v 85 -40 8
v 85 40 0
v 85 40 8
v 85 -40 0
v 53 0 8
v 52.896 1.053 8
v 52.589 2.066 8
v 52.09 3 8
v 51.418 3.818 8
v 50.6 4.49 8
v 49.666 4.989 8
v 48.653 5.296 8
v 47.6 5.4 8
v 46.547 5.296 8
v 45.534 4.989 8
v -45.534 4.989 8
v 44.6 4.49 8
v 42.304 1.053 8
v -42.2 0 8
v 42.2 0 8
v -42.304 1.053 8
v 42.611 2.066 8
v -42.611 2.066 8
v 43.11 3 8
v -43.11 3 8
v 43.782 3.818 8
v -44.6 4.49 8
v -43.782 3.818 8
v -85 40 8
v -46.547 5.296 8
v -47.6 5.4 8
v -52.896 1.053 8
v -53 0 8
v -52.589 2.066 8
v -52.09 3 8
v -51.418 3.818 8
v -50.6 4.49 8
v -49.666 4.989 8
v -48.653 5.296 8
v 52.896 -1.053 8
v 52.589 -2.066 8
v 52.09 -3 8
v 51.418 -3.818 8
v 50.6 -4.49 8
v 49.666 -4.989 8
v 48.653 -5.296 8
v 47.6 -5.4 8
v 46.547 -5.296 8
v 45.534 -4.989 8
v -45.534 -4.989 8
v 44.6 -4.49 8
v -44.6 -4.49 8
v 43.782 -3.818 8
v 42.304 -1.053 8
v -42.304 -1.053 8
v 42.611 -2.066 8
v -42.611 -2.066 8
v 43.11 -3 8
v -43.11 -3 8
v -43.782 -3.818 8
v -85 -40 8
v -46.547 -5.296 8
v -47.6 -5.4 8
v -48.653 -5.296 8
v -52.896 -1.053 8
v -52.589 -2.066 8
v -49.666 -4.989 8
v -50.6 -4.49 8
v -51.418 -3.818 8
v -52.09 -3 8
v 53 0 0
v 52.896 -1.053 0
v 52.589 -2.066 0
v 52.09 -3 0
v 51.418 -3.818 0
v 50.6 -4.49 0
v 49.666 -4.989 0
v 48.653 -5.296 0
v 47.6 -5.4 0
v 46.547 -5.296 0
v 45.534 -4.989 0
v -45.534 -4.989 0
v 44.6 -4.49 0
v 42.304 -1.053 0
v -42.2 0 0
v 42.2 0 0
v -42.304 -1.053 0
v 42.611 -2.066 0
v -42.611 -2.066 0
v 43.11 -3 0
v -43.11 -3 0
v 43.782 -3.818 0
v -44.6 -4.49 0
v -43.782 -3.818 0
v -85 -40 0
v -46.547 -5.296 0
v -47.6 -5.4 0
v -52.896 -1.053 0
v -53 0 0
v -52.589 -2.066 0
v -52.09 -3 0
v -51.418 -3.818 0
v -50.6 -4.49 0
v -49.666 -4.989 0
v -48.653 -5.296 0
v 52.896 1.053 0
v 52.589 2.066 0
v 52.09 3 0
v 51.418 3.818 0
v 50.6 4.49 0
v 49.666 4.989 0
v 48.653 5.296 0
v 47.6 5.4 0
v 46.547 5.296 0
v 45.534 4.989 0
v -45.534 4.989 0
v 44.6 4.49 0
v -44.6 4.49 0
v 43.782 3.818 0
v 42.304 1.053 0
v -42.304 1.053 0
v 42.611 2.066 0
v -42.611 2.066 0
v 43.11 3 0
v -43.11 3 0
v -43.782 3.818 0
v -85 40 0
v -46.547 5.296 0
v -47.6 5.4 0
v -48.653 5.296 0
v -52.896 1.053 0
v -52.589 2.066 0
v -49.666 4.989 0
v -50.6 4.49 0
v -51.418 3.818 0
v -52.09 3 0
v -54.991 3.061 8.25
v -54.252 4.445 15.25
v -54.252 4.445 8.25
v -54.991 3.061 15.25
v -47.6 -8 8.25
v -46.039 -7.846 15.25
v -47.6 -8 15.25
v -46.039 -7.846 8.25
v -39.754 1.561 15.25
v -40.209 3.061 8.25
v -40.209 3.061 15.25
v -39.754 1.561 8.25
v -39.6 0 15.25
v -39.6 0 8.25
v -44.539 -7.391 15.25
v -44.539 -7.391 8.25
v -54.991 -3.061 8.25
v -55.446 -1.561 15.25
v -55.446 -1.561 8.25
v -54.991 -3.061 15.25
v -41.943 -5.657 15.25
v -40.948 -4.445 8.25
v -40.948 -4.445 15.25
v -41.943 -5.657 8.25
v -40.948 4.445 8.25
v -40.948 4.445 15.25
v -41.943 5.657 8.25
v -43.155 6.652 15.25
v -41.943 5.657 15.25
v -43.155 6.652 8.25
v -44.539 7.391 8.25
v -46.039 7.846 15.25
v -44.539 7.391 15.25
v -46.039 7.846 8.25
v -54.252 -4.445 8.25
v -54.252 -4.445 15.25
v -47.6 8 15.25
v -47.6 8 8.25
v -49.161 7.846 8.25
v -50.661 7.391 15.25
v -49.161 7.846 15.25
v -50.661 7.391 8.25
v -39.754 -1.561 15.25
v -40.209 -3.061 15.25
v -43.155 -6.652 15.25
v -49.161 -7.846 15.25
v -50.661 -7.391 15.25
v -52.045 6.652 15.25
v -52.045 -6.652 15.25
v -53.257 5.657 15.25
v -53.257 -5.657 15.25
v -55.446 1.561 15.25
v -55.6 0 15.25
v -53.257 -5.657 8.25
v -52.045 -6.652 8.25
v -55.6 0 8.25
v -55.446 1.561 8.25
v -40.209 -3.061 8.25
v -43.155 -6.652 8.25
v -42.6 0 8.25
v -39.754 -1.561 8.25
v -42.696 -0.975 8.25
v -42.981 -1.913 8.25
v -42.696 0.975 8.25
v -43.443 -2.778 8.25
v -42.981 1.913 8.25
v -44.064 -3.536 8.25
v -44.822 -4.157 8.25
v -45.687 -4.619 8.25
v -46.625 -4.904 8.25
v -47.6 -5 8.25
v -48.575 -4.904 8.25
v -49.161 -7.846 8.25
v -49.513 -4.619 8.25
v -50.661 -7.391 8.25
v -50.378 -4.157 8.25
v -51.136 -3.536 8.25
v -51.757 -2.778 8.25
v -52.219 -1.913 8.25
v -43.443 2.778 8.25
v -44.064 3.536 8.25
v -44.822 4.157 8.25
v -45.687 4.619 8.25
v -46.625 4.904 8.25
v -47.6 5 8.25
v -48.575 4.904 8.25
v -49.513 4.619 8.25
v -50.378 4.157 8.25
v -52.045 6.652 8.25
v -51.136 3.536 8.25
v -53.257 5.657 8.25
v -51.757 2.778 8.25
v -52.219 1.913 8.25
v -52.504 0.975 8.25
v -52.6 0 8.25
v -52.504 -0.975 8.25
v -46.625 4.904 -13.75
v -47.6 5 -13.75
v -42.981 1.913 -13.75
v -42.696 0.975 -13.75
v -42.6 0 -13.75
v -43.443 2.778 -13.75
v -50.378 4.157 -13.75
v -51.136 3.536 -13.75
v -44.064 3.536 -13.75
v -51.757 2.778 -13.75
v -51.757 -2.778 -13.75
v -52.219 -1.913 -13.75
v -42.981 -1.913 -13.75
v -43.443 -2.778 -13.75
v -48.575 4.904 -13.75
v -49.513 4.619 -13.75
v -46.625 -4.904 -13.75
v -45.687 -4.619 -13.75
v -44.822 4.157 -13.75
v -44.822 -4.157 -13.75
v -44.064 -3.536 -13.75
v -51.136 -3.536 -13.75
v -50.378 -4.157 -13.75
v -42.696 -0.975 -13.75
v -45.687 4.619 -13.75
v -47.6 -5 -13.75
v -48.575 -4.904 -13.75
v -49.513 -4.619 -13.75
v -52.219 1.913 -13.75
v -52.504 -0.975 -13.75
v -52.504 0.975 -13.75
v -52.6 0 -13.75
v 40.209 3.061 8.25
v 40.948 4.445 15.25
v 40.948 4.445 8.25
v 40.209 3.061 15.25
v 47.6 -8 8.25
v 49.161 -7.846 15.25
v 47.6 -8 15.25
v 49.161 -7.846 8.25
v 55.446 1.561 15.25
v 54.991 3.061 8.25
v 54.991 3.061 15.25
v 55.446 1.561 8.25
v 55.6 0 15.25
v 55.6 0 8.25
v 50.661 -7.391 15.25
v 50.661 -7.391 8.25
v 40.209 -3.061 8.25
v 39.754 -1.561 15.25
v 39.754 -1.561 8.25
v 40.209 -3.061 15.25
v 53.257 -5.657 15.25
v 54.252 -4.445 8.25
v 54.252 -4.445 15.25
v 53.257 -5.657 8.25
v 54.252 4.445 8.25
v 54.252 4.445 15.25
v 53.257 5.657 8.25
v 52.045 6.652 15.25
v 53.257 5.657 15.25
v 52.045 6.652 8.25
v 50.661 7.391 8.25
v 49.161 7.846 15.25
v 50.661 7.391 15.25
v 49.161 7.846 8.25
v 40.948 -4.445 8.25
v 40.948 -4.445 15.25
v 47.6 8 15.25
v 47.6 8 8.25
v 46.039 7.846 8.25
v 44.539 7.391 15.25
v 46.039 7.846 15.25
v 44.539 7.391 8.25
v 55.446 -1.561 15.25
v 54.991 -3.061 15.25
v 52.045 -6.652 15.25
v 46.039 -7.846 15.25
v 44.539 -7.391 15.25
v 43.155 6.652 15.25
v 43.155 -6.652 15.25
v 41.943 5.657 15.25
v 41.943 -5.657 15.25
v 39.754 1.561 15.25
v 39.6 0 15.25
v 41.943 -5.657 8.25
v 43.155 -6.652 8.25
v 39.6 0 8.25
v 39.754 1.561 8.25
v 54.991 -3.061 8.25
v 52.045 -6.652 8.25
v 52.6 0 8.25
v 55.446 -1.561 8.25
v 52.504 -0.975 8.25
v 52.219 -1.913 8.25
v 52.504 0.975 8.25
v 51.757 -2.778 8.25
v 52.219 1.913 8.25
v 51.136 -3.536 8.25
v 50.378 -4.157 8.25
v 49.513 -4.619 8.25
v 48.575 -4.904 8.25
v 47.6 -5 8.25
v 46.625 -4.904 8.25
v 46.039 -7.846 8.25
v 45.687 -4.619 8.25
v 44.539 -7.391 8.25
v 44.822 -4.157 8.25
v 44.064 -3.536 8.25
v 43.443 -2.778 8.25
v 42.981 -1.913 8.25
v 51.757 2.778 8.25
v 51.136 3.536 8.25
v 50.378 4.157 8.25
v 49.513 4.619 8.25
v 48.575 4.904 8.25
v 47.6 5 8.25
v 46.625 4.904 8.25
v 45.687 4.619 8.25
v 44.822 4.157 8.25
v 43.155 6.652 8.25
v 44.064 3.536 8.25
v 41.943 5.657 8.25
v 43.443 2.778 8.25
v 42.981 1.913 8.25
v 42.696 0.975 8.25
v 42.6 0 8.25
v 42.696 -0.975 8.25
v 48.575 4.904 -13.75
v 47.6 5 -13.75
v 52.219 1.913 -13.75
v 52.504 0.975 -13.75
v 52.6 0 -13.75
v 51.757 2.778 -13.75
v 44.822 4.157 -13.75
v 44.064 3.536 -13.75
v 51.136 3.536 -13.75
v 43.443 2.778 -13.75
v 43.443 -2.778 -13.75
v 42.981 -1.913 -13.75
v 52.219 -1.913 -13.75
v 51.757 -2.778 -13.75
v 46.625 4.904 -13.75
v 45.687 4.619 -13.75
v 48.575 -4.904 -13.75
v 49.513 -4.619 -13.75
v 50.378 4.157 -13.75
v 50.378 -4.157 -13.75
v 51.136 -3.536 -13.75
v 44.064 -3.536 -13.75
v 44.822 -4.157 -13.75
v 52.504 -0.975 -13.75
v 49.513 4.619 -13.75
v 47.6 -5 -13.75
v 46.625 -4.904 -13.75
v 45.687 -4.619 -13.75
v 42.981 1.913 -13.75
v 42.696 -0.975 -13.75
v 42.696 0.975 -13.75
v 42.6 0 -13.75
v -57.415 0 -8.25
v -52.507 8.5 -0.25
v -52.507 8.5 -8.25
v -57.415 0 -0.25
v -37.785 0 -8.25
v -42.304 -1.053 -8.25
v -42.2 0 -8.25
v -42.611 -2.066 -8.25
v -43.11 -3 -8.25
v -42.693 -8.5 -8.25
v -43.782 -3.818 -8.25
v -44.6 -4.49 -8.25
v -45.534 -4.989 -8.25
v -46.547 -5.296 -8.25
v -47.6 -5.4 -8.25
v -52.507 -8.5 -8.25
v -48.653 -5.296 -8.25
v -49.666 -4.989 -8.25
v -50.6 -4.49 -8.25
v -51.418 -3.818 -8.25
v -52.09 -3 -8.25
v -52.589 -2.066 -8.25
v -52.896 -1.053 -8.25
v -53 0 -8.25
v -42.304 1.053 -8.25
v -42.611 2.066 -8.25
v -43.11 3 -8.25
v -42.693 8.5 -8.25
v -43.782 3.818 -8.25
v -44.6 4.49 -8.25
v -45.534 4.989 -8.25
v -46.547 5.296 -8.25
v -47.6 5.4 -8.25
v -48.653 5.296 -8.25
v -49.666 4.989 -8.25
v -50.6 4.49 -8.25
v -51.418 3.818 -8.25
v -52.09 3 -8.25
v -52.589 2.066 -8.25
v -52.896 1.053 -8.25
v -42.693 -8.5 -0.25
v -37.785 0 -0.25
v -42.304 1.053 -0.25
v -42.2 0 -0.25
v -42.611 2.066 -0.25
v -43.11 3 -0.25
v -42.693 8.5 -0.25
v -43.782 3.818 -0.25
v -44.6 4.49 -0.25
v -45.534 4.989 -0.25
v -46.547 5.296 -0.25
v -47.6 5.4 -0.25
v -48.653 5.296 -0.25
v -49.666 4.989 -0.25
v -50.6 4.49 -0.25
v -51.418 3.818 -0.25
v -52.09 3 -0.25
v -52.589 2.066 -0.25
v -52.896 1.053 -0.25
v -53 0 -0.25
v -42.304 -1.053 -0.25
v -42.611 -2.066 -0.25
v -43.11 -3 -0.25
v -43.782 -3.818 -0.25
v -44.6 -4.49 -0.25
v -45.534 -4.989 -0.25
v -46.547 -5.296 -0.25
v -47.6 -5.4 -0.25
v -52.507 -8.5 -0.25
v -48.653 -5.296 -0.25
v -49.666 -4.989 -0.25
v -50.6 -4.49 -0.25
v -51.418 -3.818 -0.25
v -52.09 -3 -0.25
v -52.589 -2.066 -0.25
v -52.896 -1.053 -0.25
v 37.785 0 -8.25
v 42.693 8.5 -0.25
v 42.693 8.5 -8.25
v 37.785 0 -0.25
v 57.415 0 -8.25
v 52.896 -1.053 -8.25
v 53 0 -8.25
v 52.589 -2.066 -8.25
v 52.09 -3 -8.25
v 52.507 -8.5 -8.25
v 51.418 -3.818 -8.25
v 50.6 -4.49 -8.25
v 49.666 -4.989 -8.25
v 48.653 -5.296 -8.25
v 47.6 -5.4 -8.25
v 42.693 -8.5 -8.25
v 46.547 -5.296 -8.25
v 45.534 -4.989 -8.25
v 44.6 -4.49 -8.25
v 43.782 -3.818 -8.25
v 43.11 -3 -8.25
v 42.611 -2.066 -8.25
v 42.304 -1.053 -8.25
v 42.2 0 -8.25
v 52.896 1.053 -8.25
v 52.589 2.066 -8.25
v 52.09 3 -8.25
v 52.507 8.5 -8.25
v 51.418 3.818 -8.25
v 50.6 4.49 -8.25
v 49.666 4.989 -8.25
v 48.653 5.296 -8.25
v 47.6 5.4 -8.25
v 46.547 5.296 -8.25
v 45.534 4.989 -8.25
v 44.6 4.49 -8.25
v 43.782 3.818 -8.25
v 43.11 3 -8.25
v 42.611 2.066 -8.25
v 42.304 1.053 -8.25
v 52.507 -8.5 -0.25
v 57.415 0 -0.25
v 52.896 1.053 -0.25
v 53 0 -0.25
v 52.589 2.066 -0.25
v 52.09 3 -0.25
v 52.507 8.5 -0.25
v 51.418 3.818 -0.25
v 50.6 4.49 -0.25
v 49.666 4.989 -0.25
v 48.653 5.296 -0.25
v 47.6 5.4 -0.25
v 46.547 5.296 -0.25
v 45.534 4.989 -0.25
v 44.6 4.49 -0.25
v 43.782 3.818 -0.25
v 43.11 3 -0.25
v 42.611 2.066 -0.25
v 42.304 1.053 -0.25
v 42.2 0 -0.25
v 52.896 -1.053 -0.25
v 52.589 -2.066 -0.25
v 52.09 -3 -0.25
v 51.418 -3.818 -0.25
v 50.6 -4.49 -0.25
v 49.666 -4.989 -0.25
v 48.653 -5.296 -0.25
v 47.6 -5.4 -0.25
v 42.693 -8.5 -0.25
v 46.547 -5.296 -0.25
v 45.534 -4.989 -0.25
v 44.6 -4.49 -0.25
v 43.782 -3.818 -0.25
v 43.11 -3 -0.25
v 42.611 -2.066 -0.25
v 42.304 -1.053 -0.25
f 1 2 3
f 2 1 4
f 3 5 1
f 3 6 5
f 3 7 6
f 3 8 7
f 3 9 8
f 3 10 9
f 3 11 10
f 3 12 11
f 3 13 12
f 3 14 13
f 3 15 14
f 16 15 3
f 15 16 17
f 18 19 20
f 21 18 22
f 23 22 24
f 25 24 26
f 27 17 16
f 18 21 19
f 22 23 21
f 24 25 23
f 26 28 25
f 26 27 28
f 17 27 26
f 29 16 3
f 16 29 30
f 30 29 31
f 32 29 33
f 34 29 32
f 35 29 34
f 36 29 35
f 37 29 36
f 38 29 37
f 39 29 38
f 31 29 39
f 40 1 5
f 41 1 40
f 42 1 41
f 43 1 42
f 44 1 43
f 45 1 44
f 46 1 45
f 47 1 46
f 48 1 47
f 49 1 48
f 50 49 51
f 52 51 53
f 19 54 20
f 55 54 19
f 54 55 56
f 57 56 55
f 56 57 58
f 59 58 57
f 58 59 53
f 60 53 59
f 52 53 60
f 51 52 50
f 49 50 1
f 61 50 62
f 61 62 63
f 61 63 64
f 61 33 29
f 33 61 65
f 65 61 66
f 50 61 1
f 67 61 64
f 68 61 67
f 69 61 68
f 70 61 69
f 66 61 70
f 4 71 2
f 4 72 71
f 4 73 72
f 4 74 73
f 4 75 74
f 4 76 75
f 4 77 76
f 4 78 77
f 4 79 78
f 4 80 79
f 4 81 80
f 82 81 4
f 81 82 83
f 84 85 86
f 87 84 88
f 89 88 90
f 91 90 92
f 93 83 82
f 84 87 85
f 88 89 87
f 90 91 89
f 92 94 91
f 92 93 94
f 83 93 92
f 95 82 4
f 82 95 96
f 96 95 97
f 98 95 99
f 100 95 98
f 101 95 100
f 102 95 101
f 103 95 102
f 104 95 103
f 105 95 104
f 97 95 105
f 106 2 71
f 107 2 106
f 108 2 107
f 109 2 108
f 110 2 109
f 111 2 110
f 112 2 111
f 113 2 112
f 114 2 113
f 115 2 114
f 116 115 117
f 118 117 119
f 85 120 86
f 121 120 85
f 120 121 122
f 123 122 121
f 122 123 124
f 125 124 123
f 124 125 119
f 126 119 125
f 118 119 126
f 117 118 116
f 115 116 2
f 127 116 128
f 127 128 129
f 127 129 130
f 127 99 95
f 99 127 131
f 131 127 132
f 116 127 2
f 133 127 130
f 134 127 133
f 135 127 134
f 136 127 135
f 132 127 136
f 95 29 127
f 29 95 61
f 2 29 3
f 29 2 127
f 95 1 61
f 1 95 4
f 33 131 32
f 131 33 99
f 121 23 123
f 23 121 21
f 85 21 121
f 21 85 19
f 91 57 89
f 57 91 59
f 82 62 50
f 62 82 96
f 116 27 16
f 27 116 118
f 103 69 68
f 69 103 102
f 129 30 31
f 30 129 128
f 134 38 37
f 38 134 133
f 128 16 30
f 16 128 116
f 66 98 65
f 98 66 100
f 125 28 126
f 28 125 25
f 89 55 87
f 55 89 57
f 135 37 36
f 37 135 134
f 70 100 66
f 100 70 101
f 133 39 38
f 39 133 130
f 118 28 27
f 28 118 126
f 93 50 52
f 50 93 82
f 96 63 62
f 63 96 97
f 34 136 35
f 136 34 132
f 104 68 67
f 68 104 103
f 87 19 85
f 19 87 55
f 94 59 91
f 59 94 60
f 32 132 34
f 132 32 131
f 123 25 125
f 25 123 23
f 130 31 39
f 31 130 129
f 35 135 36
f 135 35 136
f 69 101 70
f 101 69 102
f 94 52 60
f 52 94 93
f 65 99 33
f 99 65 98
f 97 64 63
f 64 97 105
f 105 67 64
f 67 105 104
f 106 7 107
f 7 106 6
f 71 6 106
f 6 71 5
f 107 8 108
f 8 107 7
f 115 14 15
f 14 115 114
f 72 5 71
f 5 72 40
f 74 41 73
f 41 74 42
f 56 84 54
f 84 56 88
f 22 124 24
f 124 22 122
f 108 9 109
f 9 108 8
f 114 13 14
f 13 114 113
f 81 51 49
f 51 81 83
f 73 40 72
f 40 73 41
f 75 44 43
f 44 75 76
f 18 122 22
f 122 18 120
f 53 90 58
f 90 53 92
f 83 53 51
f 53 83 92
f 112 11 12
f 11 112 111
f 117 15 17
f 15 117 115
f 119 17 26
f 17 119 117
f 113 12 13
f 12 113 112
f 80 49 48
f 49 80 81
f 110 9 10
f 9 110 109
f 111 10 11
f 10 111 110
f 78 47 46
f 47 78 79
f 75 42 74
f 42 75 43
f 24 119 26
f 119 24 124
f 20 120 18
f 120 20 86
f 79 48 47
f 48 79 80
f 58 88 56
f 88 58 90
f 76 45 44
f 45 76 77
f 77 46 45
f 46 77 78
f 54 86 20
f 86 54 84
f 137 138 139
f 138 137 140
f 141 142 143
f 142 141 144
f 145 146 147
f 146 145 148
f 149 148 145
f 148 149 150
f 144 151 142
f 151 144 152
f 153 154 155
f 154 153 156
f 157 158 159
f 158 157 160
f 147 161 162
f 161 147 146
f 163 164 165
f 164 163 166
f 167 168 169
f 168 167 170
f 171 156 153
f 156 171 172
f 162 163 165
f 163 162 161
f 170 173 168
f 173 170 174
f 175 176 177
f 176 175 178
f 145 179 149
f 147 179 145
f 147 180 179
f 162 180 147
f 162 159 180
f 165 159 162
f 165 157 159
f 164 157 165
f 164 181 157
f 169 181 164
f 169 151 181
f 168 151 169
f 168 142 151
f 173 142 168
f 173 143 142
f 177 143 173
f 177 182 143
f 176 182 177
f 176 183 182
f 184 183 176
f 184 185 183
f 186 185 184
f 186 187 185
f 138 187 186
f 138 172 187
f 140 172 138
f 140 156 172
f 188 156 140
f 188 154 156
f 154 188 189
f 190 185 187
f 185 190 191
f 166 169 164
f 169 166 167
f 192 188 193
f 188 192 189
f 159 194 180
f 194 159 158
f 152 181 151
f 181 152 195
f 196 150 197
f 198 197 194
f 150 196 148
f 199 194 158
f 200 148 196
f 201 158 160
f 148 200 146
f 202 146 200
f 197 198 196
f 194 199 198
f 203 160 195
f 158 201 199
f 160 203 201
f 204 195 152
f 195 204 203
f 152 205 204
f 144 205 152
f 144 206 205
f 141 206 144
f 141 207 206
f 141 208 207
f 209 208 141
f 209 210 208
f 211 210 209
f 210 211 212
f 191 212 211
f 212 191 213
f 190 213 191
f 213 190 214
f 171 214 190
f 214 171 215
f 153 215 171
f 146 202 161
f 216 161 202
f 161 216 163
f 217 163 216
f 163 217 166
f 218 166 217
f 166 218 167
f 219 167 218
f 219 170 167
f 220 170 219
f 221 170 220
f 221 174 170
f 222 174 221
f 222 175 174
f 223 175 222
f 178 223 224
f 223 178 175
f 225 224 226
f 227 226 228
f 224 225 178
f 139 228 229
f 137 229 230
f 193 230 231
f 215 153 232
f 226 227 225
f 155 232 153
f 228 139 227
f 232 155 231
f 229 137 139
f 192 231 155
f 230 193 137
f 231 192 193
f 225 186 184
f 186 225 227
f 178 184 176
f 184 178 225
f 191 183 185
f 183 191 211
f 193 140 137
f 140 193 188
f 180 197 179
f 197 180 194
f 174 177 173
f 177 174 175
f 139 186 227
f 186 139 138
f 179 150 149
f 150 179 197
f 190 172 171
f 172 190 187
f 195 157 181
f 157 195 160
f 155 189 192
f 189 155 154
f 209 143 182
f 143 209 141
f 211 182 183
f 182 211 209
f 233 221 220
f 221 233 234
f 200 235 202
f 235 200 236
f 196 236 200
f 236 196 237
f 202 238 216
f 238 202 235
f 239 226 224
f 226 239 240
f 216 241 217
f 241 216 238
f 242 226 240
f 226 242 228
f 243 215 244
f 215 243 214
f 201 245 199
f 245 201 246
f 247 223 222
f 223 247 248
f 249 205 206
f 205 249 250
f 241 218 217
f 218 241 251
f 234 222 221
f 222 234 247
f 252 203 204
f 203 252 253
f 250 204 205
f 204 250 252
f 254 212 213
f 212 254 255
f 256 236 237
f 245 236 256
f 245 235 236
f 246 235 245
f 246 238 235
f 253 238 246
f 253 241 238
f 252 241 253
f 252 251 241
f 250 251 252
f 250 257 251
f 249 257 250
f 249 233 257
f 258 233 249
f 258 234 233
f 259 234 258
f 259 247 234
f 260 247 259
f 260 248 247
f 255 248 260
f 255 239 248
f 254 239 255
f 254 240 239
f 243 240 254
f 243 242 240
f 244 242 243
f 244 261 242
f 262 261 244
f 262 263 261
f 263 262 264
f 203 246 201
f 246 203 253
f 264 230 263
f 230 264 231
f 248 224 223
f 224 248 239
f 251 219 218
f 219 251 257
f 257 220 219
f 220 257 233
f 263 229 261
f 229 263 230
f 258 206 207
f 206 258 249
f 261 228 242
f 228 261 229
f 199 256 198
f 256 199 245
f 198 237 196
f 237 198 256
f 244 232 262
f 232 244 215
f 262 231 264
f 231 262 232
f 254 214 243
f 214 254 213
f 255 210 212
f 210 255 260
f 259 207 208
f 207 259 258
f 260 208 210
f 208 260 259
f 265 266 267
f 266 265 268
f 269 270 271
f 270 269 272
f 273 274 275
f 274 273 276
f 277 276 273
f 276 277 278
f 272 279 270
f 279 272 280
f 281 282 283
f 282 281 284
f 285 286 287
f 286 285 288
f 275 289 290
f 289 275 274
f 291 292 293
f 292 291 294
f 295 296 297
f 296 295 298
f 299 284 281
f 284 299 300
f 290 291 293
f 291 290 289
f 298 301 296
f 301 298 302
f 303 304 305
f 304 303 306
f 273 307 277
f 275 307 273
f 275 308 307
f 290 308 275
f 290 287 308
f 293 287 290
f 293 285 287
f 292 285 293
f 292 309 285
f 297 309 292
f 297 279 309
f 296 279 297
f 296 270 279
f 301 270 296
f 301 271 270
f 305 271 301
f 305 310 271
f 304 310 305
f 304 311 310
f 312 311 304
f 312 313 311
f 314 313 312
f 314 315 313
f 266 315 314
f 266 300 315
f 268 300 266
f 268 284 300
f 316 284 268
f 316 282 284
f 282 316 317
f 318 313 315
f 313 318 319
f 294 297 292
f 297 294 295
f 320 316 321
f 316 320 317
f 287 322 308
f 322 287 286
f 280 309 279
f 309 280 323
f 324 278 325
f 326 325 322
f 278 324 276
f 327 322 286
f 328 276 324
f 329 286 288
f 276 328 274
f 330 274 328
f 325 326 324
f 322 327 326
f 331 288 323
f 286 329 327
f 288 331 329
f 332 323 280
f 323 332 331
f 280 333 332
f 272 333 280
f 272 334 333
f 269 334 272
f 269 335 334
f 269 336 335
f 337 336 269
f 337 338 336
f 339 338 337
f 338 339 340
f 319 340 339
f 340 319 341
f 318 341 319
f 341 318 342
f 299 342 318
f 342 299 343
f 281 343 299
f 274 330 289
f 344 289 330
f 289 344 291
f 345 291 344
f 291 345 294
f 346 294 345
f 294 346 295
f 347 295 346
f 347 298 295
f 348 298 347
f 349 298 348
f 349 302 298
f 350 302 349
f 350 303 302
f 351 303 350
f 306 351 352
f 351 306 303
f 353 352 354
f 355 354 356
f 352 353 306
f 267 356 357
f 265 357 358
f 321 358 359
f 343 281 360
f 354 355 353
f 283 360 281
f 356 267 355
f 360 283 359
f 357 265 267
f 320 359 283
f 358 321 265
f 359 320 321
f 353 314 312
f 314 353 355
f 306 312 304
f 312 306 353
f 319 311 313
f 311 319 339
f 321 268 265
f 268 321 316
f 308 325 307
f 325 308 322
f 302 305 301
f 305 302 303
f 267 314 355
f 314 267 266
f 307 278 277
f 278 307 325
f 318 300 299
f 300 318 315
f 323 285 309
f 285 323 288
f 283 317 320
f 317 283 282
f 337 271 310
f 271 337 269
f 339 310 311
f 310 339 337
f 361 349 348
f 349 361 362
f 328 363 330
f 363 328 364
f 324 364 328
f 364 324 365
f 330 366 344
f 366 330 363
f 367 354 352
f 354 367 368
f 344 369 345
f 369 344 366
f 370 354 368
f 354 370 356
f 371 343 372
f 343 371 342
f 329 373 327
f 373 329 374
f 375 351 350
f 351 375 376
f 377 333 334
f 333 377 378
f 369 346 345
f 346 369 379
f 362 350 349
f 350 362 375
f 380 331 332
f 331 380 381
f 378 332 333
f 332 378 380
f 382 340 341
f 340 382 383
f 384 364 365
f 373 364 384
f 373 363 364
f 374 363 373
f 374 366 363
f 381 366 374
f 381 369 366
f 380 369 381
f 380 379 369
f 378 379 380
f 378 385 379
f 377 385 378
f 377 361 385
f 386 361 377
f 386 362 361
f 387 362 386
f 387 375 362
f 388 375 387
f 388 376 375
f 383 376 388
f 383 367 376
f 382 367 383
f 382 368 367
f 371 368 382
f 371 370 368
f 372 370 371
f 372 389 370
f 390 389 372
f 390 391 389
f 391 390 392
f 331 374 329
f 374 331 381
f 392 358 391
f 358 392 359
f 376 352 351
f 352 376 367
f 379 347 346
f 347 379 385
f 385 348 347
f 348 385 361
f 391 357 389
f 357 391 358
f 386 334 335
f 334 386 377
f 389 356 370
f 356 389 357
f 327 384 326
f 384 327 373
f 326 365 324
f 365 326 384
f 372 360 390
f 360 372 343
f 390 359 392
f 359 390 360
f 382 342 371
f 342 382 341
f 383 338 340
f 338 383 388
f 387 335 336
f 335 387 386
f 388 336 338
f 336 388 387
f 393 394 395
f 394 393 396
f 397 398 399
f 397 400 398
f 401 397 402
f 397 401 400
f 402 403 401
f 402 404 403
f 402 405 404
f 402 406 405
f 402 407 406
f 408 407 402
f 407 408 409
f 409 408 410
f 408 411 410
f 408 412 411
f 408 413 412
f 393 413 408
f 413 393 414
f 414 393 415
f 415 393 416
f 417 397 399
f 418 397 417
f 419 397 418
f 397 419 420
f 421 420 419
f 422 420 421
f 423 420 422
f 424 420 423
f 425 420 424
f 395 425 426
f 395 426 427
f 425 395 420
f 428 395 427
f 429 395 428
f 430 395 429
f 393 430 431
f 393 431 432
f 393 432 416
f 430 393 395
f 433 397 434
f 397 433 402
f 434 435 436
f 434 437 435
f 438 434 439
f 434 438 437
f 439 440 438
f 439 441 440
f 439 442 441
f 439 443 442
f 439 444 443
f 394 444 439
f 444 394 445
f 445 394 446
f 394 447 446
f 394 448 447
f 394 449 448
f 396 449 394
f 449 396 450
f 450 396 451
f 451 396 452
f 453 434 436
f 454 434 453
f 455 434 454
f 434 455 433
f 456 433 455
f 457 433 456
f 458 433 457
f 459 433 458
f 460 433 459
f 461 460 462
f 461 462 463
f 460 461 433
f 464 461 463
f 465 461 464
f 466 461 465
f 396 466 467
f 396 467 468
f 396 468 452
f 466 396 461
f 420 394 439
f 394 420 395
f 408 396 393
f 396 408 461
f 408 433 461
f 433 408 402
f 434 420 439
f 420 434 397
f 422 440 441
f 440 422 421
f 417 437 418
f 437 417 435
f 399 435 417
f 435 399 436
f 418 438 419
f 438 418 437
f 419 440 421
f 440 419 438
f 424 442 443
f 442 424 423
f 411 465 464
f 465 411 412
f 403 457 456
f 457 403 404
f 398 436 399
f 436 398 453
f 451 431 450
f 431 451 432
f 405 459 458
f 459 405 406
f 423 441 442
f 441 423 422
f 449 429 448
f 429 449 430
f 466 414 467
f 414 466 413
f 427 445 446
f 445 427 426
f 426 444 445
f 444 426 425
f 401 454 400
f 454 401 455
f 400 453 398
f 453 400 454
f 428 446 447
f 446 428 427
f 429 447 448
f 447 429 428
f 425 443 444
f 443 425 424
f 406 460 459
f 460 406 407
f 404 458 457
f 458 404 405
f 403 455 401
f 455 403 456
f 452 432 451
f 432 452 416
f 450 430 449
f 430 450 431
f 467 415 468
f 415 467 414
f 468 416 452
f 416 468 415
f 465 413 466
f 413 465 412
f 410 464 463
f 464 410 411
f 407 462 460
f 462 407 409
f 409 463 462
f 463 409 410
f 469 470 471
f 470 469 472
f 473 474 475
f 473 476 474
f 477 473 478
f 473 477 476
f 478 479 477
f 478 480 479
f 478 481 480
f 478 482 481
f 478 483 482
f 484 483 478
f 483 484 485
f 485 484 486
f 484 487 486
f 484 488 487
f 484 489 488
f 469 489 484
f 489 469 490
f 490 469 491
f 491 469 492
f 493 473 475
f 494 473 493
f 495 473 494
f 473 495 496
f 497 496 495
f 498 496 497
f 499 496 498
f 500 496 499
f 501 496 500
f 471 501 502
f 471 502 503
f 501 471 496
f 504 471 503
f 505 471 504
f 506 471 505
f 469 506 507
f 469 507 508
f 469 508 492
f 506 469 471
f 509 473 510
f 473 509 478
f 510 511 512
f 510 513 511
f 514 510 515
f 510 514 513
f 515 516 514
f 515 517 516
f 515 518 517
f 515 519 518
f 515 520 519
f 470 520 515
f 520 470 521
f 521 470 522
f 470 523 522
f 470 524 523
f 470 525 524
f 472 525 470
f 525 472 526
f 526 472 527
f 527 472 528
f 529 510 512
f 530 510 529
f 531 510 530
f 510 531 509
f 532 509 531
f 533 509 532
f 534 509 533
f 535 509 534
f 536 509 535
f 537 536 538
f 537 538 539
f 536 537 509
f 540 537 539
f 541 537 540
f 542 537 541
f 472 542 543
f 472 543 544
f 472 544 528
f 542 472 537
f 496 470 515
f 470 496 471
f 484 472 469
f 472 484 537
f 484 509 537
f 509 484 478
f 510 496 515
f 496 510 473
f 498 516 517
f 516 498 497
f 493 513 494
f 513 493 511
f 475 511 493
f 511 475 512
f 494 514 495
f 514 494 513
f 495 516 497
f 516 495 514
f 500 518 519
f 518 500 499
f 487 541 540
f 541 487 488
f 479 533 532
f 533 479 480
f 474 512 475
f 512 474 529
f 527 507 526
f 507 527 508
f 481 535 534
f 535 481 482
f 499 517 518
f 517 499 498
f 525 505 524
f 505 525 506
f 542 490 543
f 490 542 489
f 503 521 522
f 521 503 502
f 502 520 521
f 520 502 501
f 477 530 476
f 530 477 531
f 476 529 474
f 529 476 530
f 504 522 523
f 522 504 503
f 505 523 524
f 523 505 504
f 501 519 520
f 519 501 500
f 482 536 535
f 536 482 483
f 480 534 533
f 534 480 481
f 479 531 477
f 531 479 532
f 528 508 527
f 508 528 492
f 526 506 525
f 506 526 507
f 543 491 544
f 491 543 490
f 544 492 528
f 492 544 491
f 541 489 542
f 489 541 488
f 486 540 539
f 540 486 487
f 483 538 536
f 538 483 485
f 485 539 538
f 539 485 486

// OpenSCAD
$fn = 32;

// ------------------------------------------------------------------------
// Bolted plate: 170 x 80 x 8 mm plate, 2 fasteners
// Every part is its own module, assembly() places them once.
// ------------------------------------------------------------------------

// --- part 1 ---
module plate() {
  difference() {
    translate([-85, -40, 0]) cube([170, 80, 8]);
    translate([-47.6, 0, -1]) cylinder(h = 10, d = 10.8);
    translate([47.6, 0, -1]) cylinder(h = 10, d = 10.8);
  }
}

// --- part 2 ---
module bolt1() {
  cylinder(h = 7, d = 16);
  translate([0, 0, -22]) cylinder(h = 22, d = 10);
}

// --- part 3 ---
module bolt2() {
  cylinder(h = 7, d = 16);
  translate([0, 0, -22]) cylinder(h = 22, d = 10);
}

// --- part 4 ---
module nut1() {
  difference() {
    linear_extrude(height = 8) polygon(points = [[9.815, 0], [4.907, 8.5], [-4.907, 8.5], [-9.815, 0], [-4.907, -8.5], [4.907, -8.5]]);
    translate([0, 0, -1]) cylinder(h = 10, d = 10.8);
  }
}

// --- part 5 ---
module nut2() {
  difference() {
    linear_extrude(height = 8) polygon(points = [[9.815, 0], [4.907, 8.5], [-4.907, 8.5], [-9.815, 0], [-4.907, -8.5], [4.907, -8.5]]);
    translate([0, 0, -1]) cylinder(h = 10, d = 10.8);
  }
}

// --- assembly ---
module assembly() {
  translate([0, 0, 0]) rotate([0, 0, 0]) plate();
  translate([-47.6, 0, 8.25]) rotate([0, 0, 0]) bolt1();
  translate([47.6, 0, 8.25]) rotate([0, 0, 0]) bolt2();
  translate([-47.6, 0, -8.25]) rotate([0, 0, 0]) nut1();
  translate([47.6, 0, -8.25]) rotate([0, 0, 0]) nut2();
}

assembly();
